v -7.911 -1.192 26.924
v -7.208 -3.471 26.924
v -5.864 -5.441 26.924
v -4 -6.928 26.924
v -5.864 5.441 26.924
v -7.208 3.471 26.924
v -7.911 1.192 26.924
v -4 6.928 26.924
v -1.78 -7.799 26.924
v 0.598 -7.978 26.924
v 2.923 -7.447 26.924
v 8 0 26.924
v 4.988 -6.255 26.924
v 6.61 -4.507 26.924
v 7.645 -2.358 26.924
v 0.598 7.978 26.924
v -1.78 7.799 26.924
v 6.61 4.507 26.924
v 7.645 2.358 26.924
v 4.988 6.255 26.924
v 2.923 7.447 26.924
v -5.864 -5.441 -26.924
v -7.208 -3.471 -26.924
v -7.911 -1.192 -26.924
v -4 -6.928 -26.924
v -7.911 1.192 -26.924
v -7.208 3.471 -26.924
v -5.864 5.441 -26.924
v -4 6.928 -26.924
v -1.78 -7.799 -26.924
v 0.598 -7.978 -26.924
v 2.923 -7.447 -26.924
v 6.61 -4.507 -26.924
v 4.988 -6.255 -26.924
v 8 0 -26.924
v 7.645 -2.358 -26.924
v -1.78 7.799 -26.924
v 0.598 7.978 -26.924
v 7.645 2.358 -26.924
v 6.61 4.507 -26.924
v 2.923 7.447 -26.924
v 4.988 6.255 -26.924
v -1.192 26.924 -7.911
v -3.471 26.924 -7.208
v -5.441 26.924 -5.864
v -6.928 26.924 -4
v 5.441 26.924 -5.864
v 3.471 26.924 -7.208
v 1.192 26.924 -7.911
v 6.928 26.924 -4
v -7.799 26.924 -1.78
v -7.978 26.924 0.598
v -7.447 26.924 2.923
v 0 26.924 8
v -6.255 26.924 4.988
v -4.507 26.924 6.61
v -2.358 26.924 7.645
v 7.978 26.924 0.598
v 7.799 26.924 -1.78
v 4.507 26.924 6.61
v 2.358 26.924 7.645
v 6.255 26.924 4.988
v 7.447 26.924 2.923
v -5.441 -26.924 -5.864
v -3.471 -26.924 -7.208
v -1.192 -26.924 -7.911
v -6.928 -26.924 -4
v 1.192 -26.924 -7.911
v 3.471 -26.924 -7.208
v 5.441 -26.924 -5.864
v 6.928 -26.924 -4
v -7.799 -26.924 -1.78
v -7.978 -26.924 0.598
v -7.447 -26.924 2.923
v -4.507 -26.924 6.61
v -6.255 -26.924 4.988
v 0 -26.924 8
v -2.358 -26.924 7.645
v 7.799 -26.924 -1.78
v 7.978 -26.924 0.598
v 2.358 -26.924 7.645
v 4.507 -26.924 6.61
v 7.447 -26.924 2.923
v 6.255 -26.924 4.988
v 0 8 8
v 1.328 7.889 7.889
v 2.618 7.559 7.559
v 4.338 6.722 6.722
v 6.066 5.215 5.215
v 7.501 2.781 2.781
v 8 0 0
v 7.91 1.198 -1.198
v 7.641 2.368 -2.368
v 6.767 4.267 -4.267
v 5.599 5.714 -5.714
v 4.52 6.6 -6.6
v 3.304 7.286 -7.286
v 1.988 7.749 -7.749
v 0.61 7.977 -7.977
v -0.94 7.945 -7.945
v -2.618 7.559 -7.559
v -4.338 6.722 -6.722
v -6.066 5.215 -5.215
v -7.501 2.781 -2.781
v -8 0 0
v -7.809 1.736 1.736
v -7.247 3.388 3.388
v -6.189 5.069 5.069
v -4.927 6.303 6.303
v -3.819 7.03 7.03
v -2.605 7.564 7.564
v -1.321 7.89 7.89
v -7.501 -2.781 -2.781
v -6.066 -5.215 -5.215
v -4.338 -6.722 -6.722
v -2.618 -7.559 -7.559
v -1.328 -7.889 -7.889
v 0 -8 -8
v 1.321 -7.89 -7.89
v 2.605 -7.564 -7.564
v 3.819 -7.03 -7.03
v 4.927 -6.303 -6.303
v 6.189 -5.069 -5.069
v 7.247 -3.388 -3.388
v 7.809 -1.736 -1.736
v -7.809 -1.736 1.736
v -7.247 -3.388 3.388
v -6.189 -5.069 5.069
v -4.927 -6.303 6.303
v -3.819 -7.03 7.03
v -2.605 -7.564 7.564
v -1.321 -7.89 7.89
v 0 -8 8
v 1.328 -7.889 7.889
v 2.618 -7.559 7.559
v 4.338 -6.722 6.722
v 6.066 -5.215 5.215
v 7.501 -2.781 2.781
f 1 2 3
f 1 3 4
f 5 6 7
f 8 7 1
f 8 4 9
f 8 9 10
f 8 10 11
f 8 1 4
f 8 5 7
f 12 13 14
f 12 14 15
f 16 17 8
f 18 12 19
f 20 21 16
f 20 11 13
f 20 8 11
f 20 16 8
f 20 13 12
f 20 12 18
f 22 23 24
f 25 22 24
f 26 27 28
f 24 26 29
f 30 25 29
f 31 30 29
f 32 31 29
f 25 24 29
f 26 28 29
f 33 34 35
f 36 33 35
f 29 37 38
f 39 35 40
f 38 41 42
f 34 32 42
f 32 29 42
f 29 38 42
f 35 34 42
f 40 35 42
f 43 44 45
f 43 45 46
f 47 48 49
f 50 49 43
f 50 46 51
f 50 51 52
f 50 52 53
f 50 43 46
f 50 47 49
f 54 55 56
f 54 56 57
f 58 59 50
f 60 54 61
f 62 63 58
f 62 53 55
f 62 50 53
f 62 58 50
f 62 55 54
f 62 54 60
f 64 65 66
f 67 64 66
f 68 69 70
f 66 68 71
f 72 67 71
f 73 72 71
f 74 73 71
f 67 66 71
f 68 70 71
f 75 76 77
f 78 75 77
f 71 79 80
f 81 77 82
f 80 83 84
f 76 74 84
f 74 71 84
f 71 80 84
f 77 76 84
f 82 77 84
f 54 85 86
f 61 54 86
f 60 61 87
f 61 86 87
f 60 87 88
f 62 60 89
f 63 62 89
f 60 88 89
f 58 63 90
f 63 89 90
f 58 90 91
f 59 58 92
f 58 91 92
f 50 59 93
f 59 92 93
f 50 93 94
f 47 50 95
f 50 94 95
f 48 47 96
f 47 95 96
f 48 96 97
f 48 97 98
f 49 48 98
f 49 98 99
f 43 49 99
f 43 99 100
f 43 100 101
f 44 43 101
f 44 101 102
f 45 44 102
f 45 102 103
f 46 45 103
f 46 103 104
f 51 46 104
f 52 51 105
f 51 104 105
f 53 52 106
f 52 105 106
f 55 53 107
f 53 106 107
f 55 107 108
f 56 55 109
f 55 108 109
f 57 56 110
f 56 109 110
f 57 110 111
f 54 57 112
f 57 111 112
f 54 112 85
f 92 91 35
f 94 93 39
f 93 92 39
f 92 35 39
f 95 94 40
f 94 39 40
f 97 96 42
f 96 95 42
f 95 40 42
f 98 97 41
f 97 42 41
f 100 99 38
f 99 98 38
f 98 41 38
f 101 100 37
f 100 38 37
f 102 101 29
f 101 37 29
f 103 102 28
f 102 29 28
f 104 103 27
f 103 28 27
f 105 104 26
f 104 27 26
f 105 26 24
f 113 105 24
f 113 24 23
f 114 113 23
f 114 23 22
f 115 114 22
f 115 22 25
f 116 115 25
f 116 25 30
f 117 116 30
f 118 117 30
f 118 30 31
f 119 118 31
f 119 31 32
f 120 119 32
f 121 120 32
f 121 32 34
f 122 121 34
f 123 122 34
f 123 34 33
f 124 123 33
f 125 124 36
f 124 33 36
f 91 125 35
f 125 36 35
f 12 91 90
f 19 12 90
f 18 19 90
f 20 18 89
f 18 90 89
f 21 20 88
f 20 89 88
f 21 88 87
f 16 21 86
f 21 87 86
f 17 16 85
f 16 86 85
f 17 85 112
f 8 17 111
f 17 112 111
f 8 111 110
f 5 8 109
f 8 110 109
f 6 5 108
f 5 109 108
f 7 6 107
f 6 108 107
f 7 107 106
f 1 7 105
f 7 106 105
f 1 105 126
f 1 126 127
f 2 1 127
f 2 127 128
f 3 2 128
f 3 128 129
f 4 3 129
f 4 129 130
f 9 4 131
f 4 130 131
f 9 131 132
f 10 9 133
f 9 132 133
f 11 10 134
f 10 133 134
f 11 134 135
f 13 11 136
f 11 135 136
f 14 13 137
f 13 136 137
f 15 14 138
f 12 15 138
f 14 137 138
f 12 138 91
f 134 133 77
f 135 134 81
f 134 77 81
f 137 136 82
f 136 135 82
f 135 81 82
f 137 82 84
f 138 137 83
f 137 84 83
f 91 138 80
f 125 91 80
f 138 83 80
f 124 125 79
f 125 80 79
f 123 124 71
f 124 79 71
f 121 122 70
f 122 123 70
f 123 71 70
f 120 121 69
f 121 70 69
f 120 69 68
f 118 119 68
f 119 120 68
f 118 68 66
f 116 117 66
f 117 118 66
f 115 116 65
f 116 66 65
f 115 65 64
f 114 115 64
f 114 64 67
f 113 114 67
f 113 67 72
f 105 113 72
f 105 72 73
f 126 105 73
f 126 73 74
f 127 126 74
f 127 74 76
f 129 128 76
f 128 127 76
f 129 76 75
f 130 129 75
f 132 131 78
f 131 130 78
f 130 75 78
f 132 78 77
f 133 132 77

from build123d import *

# Parameters (mm, degrees)
BOSS_EXTRUDE1_DEPTH      = 26.924
BOSS_EXTRUDE1_DEPTH_BACK = 26.924
SKETCH1_R                = 8
BOSS_EXTRUDE2_DEPTH      = 26.924
BOSS_EXTRUDE2_DEPTH_BACK = 26.924
SKETCH2_R                = 8


with BuildPart() as part:
    # Sketch1 → Boss-Extrude1 (new, two sides: drawn at the far end of the back side and taken through both)
    with BuildSketch(Plane(origin=(0, 0, 0), x_dir=(1, 0, 0), z_dir=(0, 1, 0)).offset(-BOSS_EXTRUDE1_DEPTH_BACK)):
        Circle(SKETCH1_R)
    extrude(amount=BOSS_EXTRUDE1_DEPTH + BOSS_EXTRUDE1_DEPTH_BACK)

    # Sketch2 → Boss-Extrude2 (add, two sides: drawn at the far end of the back side and taken through both)
    with BuildSketch(Plane.XY.offset(-BOSS_EXTRUDE2_DEPTH_BACK)):
        Circle(SKETCH2_R)
    extrude(amount=BOSS_EXTRUDE2_DEPTH + BOSS_EXTRUDE2_DEPTH_BACK)


solid = part.part
